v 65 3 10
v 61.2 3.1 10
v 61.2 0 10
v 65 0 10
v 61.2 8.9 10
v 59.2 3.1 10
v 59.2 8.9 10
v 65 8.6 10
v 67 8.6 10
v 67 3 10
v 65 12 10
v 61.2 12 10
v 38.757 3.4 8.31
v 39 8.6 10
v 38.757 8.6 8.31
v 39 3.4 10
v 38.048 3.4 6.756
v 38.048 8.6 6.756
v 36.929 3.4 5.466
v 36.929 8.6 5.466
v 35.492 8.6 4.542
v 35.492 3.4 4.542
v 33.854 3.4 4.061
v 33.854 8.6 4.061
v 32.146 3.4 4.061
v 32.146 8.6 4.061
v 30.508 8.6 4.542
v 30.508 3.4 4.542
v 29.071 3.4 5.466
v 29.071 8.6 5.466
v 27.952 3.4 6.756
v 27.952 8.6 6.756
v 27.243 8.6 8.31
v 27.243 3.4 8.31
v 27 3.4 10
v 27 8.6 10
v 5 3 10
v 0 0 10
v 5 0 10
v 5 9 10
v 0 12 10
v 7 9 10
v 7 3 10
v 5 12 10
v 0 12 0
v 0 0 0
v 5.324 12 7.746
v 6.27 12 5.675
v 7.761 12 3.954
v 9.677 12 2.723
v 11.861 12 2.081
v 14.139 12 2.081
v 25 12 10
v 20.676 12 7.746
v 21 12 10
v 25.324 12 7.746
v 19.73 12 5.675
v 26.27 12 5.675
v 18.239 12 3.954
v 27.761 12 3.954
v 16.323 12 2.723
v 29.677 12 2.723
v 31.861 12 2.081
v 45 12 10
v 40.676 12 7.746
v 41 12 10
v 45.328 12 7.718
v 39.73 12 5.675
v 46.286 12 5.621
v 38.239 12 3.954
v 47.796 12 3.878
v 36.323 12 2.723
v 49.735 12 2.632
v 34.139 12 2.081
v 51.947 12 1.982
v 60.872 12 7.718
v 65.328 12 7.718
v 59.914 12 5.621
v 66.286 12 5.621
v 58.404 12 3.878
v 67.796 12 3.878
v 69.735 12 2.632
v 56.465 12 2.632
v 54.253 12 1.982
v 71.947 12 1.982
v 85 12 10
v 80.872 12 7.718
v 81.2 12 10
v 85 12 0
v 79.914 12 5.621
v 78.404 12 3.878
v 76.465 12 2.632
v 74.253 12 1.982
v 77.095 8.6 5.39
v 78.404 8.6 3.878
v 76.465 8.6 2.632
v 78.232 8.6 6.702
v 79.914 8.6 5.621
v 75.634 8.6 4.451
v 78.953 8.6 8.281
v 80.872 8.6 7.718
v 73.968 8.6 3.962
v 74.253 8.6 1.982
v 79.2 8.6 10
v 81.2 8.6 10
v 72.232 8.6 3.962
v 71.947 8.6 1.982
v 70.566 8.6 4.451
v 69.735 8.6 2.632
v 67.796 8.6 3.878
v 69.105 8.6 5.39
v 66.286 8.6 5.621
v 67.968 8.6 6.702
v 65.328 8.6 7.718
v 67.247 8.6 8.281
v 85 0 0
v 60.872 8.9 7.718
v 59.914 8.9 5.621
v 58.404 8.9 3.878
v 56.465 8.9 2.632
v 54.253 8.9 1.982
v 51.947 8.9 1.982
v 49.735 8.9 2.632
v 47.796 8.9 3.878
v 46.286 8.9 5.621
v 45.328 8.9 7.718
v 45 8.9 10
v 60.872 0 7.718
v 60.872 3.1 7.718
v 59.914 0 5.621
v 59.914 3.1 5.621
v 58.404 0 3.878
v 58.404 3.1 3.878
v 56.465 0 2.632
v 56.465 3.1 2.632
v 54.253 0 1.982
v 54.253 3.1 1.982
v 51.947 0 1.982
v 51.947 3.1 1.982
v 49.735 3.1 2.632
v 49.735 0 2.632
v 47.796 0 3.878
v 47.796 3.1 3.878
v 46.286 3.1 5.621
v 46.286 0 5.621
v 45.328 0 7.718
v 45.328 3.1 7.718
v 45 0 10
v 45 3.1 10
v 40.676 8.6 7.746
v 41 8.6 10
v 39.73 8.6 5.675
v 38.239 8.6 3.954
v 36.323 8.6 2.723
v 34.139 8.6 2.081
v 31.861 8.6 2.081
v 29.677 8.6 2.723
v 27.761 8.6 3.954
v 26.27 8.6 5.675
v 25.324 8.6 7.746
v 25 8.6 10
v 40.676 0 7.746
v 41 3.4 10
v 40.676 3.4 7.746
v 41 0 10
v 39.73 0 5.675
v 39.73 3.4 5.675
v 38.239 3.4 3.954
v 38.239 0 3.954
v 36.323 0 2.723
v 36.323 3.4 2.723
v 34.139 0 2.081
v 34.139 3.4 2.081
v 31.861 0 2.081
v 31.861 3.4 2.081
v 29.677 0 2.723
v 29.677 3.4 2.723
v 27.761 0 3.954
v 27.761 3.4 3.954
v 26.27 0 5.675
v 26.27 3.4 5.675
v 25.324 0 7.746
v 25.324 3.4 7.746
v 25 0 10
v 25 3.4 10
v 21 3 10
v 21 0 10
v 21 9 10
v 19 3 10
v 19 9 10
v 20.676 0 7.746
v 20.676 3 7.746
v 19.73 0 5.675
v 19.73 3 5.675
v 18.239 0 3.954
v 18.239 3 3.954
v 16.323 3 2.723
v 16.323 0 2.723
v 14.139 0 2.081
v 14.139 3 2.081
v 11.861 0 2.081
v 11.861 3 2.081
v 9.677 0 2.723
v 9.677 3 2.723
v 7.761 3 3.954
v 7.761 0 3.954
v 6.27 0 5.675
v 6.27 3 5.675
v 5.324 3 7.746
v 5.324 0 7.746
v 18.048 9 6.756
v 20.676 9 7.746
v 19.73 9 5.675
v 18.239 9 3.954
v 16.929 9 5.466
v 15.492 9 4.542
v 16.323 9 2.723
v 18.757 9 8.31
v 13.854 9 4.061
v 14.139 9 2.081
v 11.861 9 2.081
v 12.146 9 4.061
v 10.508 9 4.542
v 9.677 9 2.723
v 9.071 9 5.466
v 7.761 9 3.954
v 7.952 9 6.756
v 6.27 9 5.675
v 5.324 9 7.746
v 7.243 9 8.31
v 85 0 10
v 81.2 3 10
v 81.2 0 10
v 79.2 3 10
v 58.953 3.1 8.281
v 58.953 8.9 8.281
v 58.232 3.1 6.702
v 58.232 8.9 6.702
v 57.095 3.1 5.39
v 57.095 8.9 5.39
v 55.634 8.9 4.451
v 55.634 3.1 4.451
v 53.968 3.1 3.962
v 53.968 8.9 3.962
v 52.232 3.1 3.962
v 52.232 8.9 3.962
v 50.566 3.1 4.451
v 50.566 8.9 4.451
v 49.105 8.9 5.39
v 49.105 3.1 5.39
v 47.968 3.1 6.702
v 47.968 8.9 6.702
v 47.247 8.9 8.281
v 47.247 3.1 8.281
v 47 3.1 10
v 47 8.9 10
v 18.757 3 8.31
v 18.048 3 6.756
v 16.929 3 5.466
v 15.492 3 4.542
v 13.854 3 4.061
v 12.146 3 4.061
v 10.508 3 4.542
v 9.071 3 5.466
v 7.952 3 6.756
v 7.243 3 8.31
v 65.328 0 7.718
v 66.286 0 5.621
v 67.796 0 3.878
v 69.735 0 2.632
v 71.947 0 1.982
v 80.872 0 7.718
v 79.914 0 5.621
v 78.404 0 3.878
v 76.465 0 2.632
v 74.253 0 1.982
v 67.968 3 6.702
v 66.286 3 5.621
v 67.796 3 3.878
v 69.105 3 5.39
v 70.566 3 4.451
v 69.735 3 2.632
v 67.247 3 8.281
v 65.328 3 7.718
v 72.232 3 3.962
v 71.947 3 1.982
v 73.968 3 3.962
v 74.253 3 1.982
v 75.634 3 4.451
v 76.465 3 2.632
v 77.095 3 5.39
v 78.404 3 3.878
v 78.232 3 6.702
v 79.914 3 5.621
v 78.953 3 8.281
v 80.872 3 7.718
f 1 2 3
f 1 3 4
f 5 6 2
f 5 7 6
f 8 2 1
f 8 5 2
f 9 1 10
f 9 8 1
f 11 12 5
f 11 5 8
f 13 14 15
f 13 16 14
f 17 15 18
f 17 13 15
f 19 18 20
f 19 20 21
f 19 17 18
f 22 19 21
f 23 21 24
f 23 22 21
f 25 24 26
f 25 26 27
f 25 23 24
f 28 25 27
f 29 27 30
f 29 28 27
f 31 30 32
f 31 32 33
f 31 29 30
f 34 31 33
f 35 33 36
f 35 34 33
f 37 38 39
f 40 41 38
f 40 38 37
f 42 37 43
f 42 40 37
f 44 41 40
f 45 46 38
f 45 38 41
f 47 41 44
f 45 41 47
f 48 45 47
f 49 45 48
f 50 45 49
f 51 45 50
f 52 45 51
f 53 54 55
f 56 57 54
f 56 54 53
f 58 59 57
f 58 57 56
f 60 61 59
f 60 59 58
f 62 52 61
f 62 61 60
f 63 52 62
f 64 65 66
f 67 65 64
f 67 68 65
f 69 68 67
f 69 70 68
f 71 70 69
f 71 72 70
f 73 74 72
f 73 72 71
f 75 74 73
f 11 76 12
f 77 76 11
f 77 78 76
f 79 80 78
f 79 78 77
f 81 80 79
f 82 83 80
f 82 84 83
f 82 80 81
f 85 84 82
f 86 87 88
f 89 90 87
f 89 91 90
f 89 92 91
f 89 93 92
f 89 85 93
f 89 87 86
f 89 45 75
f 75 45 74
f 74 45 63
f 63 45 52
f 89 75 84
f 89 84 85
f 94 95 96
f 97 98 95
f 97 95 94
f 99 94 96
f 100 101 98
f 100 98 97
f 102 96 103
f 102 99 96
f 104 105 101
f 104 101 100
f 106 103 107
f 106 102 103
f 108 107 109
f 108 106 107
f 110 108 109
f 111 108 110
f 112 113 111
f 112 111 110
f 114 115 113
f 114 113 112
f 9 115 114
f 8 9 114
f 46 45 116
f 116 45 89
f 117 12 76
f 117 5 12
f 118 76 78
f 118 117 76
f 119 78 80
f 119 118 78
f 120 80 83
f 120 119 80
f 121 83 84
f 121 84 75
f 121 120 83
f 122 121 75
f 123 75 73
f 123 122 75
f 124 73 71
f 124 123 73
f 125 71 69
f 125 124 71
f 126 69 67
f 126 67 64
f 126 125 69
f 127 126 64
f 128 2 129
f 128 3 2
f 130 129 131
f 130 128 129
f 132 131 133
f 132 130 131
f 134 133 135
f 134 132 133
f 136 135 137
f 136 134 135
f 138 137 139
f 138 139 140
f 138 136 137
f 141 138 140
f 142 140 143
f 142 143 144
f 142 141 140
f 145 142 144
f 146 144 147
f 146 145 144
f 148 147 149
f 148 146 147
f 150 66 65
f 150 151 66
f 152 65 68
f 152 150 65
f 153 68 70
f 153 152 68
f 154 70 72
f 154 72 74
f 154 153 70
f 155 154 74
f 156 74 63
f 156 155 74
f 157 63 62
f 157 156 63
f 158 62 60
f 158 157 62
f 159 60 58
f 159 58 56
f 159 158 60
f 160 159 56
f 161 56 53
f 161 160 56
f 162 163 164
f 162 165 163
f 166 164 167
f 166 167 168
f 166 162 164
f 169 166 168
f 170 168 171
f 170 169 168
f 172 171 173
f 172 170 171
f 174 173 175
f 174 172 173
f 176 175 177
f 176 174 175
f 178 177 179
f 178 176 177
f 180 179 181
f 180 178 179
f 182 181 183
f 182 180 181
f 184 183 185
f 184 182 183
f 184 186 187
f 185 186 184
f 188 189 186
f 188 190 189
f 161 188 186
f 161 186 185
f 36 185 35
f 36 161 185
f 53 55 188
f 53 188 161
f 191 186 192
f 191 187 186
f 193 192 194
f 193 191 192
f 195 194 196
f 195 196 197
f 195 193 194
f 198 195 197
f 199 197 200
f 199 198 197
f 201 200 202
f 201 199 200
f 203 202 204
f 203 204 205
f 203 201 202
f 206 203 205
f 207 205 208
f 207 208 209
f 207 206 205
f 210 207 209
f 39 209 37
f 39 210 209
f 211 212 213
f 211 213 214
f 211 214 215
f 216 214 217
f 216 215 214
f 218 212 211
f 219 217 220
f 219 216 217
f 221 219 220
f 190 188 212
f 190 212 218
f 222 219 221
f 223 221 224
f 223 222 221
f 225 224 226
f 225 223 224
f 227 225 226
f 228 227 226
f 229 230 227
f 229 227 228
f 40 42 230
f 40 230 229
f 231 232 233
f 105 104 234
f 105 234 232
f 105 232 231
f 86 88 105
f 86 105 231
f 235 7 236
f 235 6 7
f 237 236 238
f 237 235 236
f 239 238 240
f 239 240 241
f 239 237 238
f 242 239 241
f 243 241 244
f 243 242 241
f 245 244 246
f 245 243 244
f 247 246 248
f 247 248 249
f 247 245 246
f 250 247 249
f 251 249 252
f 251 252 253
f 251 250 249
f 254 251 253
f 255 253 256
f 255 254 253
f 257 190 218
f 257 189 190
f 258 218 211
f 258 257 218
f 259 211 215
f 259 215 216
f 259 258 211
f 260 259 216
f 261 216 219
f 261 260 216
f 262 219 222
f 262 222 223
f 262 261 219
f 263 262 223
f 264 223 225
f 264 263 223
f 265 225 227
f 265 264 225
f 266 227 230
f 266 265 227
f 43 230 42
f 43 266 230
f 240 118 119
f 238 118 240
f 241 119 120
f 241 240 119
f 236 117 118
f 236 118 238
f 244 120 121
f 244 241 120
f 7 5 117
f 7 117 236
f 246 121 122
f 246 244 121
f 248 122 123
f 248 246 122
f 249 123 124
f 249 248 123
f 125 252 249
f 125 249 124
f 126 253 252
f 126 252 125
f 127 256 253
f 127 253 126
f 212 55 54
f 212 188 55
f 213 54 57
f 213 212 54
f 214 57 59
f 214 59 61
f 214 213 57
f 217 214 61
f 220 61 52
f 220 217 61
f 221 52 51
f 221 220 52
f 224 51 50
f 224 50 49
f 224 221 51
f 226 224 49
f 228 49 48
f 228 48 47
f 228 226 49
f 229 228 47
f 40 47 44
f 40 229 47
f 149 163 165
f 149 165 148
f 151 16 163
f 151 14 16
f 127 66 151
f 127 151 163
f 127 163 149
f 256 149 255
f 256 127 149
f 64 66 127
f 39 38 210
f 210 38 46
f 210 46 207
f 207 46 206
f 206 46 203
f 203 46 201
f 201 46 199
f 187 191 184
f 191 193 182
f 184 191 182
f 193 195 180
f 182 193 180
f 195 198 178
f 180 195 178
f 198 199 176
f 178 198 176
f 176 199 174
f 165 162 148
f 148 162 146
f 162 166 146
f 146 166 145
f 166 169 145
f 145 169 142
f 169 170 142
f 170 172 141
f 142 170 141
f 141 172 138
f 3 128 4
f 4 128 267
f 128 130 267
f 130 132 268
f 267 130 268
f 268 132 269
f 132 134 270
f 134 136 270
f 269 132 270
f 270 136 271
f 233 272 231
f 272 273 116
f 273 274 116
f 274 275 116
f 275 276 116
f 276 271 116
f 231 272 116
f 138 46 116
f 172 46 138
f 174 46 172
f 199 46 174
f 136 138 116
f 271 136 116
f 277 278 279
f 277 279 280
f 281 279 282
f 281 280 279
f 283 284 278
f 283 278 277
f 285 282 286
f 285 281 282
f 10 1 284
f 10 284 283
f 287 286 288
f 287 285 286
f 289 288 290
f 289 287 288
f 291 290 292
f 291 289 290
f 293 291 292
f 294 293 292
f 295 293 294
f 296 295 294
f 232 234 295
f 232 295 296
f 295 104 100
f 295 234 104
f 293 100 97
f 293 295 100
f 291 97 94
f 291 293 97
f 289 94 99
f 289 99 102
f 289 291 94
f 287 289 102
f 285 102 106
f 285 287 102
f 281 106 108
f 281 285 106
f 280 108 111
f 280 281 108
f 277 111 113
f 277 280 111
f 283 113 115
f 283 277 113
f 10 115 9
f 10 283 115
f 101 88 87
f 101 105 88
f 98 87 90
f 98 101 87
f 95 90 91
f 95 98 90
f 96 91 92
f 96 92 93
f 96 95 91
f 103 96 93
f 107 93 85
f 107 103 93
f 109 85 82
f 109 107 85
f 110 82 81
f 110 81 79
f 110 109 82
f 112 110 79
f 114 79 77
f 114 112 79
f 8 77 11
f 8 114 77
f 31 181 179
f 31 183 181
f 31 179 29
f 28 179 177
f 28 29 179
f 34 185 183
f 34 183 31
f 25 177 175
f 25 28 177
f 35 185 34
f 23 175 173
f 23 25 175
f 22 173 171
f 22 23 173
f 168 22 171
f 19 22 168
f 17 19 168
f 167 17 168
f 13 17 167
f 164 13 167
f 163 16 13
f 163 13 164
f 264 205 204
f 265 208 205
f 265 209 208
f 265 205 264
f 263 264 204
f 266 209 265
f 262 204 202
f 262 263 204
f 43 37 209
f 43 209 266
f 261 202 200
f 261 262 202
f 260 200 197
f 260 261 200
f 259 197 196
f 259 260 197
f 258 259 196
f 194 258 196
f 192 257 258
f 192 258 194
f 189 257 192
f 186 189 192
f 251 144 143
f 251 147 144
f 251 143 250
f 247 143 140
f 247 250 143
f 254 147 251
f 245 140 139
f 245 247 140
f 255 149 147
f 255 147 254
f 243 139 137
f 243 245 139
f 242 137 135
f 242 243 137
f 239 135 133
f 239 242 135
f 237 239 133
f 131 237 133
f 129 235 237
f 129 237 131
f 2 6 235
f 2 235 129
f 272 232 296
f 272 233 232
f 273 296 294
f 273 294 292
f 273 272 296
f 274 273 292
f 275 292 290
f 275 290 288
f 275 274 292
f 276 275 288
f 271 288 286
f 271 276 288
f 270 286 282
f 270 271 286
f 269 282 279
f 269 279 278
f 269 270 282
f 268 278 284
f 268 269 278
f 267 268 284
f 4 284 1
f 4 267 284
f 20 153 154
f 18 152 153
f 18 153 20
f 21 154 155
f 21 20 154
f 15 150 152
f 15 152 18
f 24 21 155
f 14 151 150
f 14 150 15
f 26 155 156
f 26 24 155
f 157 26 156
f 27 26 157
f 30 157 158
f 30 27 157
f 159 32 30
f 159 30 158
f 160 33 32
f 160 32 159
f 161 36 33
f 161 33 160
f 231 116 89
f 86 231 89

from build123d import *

# Parameters (mm, degrees)
F1_W     = 85
F1_H     = 12
F2_DEPTH = 10


with BuildPart() as f2:
    # F1 (on Top) → F2 (new body)
    with BuildSketch(Plane.XY):
        with Locations((42.5, 6)):
            Rectangle(F1_W, F1_H)
    extrude(amount=F2_DEPTH)

    # F3 (on offset) → F4 (revolve, cut)
    with BuildSketch(Plane.XY.offset(10)):
        Polygon((5, 3), (5, 0), (13, 0), (13, 12), (5, 12), (5, 9), (7, 9), (7, 3), align=None)
    revolve(axis=Axis((13, 6, 10), (0, 1, 0)), mode=Mode.SUBTRACT)

    # F5 (on offset) → F6 (revolve, cut)
    with BuildSketch(Plane.XY.offset(10)):
        Polygon((25, 3.4), (25, 0), (33, 0), (33, 12), (25, 12), (25, 8.6), (27, 8.6), (27, 3.4), align=None)
    revolve(axis=Axis((33, 6, 10), (0, 1, 0)), mode=Mode.SUBTRACT)

    # F7 (on offset) → F8 (revolve, cut)
    with BuildSketch(Plane.XY.offset(10)):
        Polygon((45, 3.1), (45, 0), (53.1, 0), (53.1, 12), (45, 12), (45, 8.9), (47, 8.9), (47, 3.1), align=None)
    revolve(axis=Axis((53.1, 6, 10), (0, 1, 0)), mode=Mode.SUBTRACT)

    # F9 (on offset) → F10 (revolve, cut)
    with BuildSketch(Plane.XY.offset(10)):
        Polygon((65, 3), (65, 0), (73.1, 0), (73.1, 12), (65, 12), (65, 8.6), (67, 8.6), (67, 3), align=None)
    revolve(axis=Axis((73.1, 6, 10), (0, 1, 0)), mode=Mode.SUBTRACT)


solid = f2.part
